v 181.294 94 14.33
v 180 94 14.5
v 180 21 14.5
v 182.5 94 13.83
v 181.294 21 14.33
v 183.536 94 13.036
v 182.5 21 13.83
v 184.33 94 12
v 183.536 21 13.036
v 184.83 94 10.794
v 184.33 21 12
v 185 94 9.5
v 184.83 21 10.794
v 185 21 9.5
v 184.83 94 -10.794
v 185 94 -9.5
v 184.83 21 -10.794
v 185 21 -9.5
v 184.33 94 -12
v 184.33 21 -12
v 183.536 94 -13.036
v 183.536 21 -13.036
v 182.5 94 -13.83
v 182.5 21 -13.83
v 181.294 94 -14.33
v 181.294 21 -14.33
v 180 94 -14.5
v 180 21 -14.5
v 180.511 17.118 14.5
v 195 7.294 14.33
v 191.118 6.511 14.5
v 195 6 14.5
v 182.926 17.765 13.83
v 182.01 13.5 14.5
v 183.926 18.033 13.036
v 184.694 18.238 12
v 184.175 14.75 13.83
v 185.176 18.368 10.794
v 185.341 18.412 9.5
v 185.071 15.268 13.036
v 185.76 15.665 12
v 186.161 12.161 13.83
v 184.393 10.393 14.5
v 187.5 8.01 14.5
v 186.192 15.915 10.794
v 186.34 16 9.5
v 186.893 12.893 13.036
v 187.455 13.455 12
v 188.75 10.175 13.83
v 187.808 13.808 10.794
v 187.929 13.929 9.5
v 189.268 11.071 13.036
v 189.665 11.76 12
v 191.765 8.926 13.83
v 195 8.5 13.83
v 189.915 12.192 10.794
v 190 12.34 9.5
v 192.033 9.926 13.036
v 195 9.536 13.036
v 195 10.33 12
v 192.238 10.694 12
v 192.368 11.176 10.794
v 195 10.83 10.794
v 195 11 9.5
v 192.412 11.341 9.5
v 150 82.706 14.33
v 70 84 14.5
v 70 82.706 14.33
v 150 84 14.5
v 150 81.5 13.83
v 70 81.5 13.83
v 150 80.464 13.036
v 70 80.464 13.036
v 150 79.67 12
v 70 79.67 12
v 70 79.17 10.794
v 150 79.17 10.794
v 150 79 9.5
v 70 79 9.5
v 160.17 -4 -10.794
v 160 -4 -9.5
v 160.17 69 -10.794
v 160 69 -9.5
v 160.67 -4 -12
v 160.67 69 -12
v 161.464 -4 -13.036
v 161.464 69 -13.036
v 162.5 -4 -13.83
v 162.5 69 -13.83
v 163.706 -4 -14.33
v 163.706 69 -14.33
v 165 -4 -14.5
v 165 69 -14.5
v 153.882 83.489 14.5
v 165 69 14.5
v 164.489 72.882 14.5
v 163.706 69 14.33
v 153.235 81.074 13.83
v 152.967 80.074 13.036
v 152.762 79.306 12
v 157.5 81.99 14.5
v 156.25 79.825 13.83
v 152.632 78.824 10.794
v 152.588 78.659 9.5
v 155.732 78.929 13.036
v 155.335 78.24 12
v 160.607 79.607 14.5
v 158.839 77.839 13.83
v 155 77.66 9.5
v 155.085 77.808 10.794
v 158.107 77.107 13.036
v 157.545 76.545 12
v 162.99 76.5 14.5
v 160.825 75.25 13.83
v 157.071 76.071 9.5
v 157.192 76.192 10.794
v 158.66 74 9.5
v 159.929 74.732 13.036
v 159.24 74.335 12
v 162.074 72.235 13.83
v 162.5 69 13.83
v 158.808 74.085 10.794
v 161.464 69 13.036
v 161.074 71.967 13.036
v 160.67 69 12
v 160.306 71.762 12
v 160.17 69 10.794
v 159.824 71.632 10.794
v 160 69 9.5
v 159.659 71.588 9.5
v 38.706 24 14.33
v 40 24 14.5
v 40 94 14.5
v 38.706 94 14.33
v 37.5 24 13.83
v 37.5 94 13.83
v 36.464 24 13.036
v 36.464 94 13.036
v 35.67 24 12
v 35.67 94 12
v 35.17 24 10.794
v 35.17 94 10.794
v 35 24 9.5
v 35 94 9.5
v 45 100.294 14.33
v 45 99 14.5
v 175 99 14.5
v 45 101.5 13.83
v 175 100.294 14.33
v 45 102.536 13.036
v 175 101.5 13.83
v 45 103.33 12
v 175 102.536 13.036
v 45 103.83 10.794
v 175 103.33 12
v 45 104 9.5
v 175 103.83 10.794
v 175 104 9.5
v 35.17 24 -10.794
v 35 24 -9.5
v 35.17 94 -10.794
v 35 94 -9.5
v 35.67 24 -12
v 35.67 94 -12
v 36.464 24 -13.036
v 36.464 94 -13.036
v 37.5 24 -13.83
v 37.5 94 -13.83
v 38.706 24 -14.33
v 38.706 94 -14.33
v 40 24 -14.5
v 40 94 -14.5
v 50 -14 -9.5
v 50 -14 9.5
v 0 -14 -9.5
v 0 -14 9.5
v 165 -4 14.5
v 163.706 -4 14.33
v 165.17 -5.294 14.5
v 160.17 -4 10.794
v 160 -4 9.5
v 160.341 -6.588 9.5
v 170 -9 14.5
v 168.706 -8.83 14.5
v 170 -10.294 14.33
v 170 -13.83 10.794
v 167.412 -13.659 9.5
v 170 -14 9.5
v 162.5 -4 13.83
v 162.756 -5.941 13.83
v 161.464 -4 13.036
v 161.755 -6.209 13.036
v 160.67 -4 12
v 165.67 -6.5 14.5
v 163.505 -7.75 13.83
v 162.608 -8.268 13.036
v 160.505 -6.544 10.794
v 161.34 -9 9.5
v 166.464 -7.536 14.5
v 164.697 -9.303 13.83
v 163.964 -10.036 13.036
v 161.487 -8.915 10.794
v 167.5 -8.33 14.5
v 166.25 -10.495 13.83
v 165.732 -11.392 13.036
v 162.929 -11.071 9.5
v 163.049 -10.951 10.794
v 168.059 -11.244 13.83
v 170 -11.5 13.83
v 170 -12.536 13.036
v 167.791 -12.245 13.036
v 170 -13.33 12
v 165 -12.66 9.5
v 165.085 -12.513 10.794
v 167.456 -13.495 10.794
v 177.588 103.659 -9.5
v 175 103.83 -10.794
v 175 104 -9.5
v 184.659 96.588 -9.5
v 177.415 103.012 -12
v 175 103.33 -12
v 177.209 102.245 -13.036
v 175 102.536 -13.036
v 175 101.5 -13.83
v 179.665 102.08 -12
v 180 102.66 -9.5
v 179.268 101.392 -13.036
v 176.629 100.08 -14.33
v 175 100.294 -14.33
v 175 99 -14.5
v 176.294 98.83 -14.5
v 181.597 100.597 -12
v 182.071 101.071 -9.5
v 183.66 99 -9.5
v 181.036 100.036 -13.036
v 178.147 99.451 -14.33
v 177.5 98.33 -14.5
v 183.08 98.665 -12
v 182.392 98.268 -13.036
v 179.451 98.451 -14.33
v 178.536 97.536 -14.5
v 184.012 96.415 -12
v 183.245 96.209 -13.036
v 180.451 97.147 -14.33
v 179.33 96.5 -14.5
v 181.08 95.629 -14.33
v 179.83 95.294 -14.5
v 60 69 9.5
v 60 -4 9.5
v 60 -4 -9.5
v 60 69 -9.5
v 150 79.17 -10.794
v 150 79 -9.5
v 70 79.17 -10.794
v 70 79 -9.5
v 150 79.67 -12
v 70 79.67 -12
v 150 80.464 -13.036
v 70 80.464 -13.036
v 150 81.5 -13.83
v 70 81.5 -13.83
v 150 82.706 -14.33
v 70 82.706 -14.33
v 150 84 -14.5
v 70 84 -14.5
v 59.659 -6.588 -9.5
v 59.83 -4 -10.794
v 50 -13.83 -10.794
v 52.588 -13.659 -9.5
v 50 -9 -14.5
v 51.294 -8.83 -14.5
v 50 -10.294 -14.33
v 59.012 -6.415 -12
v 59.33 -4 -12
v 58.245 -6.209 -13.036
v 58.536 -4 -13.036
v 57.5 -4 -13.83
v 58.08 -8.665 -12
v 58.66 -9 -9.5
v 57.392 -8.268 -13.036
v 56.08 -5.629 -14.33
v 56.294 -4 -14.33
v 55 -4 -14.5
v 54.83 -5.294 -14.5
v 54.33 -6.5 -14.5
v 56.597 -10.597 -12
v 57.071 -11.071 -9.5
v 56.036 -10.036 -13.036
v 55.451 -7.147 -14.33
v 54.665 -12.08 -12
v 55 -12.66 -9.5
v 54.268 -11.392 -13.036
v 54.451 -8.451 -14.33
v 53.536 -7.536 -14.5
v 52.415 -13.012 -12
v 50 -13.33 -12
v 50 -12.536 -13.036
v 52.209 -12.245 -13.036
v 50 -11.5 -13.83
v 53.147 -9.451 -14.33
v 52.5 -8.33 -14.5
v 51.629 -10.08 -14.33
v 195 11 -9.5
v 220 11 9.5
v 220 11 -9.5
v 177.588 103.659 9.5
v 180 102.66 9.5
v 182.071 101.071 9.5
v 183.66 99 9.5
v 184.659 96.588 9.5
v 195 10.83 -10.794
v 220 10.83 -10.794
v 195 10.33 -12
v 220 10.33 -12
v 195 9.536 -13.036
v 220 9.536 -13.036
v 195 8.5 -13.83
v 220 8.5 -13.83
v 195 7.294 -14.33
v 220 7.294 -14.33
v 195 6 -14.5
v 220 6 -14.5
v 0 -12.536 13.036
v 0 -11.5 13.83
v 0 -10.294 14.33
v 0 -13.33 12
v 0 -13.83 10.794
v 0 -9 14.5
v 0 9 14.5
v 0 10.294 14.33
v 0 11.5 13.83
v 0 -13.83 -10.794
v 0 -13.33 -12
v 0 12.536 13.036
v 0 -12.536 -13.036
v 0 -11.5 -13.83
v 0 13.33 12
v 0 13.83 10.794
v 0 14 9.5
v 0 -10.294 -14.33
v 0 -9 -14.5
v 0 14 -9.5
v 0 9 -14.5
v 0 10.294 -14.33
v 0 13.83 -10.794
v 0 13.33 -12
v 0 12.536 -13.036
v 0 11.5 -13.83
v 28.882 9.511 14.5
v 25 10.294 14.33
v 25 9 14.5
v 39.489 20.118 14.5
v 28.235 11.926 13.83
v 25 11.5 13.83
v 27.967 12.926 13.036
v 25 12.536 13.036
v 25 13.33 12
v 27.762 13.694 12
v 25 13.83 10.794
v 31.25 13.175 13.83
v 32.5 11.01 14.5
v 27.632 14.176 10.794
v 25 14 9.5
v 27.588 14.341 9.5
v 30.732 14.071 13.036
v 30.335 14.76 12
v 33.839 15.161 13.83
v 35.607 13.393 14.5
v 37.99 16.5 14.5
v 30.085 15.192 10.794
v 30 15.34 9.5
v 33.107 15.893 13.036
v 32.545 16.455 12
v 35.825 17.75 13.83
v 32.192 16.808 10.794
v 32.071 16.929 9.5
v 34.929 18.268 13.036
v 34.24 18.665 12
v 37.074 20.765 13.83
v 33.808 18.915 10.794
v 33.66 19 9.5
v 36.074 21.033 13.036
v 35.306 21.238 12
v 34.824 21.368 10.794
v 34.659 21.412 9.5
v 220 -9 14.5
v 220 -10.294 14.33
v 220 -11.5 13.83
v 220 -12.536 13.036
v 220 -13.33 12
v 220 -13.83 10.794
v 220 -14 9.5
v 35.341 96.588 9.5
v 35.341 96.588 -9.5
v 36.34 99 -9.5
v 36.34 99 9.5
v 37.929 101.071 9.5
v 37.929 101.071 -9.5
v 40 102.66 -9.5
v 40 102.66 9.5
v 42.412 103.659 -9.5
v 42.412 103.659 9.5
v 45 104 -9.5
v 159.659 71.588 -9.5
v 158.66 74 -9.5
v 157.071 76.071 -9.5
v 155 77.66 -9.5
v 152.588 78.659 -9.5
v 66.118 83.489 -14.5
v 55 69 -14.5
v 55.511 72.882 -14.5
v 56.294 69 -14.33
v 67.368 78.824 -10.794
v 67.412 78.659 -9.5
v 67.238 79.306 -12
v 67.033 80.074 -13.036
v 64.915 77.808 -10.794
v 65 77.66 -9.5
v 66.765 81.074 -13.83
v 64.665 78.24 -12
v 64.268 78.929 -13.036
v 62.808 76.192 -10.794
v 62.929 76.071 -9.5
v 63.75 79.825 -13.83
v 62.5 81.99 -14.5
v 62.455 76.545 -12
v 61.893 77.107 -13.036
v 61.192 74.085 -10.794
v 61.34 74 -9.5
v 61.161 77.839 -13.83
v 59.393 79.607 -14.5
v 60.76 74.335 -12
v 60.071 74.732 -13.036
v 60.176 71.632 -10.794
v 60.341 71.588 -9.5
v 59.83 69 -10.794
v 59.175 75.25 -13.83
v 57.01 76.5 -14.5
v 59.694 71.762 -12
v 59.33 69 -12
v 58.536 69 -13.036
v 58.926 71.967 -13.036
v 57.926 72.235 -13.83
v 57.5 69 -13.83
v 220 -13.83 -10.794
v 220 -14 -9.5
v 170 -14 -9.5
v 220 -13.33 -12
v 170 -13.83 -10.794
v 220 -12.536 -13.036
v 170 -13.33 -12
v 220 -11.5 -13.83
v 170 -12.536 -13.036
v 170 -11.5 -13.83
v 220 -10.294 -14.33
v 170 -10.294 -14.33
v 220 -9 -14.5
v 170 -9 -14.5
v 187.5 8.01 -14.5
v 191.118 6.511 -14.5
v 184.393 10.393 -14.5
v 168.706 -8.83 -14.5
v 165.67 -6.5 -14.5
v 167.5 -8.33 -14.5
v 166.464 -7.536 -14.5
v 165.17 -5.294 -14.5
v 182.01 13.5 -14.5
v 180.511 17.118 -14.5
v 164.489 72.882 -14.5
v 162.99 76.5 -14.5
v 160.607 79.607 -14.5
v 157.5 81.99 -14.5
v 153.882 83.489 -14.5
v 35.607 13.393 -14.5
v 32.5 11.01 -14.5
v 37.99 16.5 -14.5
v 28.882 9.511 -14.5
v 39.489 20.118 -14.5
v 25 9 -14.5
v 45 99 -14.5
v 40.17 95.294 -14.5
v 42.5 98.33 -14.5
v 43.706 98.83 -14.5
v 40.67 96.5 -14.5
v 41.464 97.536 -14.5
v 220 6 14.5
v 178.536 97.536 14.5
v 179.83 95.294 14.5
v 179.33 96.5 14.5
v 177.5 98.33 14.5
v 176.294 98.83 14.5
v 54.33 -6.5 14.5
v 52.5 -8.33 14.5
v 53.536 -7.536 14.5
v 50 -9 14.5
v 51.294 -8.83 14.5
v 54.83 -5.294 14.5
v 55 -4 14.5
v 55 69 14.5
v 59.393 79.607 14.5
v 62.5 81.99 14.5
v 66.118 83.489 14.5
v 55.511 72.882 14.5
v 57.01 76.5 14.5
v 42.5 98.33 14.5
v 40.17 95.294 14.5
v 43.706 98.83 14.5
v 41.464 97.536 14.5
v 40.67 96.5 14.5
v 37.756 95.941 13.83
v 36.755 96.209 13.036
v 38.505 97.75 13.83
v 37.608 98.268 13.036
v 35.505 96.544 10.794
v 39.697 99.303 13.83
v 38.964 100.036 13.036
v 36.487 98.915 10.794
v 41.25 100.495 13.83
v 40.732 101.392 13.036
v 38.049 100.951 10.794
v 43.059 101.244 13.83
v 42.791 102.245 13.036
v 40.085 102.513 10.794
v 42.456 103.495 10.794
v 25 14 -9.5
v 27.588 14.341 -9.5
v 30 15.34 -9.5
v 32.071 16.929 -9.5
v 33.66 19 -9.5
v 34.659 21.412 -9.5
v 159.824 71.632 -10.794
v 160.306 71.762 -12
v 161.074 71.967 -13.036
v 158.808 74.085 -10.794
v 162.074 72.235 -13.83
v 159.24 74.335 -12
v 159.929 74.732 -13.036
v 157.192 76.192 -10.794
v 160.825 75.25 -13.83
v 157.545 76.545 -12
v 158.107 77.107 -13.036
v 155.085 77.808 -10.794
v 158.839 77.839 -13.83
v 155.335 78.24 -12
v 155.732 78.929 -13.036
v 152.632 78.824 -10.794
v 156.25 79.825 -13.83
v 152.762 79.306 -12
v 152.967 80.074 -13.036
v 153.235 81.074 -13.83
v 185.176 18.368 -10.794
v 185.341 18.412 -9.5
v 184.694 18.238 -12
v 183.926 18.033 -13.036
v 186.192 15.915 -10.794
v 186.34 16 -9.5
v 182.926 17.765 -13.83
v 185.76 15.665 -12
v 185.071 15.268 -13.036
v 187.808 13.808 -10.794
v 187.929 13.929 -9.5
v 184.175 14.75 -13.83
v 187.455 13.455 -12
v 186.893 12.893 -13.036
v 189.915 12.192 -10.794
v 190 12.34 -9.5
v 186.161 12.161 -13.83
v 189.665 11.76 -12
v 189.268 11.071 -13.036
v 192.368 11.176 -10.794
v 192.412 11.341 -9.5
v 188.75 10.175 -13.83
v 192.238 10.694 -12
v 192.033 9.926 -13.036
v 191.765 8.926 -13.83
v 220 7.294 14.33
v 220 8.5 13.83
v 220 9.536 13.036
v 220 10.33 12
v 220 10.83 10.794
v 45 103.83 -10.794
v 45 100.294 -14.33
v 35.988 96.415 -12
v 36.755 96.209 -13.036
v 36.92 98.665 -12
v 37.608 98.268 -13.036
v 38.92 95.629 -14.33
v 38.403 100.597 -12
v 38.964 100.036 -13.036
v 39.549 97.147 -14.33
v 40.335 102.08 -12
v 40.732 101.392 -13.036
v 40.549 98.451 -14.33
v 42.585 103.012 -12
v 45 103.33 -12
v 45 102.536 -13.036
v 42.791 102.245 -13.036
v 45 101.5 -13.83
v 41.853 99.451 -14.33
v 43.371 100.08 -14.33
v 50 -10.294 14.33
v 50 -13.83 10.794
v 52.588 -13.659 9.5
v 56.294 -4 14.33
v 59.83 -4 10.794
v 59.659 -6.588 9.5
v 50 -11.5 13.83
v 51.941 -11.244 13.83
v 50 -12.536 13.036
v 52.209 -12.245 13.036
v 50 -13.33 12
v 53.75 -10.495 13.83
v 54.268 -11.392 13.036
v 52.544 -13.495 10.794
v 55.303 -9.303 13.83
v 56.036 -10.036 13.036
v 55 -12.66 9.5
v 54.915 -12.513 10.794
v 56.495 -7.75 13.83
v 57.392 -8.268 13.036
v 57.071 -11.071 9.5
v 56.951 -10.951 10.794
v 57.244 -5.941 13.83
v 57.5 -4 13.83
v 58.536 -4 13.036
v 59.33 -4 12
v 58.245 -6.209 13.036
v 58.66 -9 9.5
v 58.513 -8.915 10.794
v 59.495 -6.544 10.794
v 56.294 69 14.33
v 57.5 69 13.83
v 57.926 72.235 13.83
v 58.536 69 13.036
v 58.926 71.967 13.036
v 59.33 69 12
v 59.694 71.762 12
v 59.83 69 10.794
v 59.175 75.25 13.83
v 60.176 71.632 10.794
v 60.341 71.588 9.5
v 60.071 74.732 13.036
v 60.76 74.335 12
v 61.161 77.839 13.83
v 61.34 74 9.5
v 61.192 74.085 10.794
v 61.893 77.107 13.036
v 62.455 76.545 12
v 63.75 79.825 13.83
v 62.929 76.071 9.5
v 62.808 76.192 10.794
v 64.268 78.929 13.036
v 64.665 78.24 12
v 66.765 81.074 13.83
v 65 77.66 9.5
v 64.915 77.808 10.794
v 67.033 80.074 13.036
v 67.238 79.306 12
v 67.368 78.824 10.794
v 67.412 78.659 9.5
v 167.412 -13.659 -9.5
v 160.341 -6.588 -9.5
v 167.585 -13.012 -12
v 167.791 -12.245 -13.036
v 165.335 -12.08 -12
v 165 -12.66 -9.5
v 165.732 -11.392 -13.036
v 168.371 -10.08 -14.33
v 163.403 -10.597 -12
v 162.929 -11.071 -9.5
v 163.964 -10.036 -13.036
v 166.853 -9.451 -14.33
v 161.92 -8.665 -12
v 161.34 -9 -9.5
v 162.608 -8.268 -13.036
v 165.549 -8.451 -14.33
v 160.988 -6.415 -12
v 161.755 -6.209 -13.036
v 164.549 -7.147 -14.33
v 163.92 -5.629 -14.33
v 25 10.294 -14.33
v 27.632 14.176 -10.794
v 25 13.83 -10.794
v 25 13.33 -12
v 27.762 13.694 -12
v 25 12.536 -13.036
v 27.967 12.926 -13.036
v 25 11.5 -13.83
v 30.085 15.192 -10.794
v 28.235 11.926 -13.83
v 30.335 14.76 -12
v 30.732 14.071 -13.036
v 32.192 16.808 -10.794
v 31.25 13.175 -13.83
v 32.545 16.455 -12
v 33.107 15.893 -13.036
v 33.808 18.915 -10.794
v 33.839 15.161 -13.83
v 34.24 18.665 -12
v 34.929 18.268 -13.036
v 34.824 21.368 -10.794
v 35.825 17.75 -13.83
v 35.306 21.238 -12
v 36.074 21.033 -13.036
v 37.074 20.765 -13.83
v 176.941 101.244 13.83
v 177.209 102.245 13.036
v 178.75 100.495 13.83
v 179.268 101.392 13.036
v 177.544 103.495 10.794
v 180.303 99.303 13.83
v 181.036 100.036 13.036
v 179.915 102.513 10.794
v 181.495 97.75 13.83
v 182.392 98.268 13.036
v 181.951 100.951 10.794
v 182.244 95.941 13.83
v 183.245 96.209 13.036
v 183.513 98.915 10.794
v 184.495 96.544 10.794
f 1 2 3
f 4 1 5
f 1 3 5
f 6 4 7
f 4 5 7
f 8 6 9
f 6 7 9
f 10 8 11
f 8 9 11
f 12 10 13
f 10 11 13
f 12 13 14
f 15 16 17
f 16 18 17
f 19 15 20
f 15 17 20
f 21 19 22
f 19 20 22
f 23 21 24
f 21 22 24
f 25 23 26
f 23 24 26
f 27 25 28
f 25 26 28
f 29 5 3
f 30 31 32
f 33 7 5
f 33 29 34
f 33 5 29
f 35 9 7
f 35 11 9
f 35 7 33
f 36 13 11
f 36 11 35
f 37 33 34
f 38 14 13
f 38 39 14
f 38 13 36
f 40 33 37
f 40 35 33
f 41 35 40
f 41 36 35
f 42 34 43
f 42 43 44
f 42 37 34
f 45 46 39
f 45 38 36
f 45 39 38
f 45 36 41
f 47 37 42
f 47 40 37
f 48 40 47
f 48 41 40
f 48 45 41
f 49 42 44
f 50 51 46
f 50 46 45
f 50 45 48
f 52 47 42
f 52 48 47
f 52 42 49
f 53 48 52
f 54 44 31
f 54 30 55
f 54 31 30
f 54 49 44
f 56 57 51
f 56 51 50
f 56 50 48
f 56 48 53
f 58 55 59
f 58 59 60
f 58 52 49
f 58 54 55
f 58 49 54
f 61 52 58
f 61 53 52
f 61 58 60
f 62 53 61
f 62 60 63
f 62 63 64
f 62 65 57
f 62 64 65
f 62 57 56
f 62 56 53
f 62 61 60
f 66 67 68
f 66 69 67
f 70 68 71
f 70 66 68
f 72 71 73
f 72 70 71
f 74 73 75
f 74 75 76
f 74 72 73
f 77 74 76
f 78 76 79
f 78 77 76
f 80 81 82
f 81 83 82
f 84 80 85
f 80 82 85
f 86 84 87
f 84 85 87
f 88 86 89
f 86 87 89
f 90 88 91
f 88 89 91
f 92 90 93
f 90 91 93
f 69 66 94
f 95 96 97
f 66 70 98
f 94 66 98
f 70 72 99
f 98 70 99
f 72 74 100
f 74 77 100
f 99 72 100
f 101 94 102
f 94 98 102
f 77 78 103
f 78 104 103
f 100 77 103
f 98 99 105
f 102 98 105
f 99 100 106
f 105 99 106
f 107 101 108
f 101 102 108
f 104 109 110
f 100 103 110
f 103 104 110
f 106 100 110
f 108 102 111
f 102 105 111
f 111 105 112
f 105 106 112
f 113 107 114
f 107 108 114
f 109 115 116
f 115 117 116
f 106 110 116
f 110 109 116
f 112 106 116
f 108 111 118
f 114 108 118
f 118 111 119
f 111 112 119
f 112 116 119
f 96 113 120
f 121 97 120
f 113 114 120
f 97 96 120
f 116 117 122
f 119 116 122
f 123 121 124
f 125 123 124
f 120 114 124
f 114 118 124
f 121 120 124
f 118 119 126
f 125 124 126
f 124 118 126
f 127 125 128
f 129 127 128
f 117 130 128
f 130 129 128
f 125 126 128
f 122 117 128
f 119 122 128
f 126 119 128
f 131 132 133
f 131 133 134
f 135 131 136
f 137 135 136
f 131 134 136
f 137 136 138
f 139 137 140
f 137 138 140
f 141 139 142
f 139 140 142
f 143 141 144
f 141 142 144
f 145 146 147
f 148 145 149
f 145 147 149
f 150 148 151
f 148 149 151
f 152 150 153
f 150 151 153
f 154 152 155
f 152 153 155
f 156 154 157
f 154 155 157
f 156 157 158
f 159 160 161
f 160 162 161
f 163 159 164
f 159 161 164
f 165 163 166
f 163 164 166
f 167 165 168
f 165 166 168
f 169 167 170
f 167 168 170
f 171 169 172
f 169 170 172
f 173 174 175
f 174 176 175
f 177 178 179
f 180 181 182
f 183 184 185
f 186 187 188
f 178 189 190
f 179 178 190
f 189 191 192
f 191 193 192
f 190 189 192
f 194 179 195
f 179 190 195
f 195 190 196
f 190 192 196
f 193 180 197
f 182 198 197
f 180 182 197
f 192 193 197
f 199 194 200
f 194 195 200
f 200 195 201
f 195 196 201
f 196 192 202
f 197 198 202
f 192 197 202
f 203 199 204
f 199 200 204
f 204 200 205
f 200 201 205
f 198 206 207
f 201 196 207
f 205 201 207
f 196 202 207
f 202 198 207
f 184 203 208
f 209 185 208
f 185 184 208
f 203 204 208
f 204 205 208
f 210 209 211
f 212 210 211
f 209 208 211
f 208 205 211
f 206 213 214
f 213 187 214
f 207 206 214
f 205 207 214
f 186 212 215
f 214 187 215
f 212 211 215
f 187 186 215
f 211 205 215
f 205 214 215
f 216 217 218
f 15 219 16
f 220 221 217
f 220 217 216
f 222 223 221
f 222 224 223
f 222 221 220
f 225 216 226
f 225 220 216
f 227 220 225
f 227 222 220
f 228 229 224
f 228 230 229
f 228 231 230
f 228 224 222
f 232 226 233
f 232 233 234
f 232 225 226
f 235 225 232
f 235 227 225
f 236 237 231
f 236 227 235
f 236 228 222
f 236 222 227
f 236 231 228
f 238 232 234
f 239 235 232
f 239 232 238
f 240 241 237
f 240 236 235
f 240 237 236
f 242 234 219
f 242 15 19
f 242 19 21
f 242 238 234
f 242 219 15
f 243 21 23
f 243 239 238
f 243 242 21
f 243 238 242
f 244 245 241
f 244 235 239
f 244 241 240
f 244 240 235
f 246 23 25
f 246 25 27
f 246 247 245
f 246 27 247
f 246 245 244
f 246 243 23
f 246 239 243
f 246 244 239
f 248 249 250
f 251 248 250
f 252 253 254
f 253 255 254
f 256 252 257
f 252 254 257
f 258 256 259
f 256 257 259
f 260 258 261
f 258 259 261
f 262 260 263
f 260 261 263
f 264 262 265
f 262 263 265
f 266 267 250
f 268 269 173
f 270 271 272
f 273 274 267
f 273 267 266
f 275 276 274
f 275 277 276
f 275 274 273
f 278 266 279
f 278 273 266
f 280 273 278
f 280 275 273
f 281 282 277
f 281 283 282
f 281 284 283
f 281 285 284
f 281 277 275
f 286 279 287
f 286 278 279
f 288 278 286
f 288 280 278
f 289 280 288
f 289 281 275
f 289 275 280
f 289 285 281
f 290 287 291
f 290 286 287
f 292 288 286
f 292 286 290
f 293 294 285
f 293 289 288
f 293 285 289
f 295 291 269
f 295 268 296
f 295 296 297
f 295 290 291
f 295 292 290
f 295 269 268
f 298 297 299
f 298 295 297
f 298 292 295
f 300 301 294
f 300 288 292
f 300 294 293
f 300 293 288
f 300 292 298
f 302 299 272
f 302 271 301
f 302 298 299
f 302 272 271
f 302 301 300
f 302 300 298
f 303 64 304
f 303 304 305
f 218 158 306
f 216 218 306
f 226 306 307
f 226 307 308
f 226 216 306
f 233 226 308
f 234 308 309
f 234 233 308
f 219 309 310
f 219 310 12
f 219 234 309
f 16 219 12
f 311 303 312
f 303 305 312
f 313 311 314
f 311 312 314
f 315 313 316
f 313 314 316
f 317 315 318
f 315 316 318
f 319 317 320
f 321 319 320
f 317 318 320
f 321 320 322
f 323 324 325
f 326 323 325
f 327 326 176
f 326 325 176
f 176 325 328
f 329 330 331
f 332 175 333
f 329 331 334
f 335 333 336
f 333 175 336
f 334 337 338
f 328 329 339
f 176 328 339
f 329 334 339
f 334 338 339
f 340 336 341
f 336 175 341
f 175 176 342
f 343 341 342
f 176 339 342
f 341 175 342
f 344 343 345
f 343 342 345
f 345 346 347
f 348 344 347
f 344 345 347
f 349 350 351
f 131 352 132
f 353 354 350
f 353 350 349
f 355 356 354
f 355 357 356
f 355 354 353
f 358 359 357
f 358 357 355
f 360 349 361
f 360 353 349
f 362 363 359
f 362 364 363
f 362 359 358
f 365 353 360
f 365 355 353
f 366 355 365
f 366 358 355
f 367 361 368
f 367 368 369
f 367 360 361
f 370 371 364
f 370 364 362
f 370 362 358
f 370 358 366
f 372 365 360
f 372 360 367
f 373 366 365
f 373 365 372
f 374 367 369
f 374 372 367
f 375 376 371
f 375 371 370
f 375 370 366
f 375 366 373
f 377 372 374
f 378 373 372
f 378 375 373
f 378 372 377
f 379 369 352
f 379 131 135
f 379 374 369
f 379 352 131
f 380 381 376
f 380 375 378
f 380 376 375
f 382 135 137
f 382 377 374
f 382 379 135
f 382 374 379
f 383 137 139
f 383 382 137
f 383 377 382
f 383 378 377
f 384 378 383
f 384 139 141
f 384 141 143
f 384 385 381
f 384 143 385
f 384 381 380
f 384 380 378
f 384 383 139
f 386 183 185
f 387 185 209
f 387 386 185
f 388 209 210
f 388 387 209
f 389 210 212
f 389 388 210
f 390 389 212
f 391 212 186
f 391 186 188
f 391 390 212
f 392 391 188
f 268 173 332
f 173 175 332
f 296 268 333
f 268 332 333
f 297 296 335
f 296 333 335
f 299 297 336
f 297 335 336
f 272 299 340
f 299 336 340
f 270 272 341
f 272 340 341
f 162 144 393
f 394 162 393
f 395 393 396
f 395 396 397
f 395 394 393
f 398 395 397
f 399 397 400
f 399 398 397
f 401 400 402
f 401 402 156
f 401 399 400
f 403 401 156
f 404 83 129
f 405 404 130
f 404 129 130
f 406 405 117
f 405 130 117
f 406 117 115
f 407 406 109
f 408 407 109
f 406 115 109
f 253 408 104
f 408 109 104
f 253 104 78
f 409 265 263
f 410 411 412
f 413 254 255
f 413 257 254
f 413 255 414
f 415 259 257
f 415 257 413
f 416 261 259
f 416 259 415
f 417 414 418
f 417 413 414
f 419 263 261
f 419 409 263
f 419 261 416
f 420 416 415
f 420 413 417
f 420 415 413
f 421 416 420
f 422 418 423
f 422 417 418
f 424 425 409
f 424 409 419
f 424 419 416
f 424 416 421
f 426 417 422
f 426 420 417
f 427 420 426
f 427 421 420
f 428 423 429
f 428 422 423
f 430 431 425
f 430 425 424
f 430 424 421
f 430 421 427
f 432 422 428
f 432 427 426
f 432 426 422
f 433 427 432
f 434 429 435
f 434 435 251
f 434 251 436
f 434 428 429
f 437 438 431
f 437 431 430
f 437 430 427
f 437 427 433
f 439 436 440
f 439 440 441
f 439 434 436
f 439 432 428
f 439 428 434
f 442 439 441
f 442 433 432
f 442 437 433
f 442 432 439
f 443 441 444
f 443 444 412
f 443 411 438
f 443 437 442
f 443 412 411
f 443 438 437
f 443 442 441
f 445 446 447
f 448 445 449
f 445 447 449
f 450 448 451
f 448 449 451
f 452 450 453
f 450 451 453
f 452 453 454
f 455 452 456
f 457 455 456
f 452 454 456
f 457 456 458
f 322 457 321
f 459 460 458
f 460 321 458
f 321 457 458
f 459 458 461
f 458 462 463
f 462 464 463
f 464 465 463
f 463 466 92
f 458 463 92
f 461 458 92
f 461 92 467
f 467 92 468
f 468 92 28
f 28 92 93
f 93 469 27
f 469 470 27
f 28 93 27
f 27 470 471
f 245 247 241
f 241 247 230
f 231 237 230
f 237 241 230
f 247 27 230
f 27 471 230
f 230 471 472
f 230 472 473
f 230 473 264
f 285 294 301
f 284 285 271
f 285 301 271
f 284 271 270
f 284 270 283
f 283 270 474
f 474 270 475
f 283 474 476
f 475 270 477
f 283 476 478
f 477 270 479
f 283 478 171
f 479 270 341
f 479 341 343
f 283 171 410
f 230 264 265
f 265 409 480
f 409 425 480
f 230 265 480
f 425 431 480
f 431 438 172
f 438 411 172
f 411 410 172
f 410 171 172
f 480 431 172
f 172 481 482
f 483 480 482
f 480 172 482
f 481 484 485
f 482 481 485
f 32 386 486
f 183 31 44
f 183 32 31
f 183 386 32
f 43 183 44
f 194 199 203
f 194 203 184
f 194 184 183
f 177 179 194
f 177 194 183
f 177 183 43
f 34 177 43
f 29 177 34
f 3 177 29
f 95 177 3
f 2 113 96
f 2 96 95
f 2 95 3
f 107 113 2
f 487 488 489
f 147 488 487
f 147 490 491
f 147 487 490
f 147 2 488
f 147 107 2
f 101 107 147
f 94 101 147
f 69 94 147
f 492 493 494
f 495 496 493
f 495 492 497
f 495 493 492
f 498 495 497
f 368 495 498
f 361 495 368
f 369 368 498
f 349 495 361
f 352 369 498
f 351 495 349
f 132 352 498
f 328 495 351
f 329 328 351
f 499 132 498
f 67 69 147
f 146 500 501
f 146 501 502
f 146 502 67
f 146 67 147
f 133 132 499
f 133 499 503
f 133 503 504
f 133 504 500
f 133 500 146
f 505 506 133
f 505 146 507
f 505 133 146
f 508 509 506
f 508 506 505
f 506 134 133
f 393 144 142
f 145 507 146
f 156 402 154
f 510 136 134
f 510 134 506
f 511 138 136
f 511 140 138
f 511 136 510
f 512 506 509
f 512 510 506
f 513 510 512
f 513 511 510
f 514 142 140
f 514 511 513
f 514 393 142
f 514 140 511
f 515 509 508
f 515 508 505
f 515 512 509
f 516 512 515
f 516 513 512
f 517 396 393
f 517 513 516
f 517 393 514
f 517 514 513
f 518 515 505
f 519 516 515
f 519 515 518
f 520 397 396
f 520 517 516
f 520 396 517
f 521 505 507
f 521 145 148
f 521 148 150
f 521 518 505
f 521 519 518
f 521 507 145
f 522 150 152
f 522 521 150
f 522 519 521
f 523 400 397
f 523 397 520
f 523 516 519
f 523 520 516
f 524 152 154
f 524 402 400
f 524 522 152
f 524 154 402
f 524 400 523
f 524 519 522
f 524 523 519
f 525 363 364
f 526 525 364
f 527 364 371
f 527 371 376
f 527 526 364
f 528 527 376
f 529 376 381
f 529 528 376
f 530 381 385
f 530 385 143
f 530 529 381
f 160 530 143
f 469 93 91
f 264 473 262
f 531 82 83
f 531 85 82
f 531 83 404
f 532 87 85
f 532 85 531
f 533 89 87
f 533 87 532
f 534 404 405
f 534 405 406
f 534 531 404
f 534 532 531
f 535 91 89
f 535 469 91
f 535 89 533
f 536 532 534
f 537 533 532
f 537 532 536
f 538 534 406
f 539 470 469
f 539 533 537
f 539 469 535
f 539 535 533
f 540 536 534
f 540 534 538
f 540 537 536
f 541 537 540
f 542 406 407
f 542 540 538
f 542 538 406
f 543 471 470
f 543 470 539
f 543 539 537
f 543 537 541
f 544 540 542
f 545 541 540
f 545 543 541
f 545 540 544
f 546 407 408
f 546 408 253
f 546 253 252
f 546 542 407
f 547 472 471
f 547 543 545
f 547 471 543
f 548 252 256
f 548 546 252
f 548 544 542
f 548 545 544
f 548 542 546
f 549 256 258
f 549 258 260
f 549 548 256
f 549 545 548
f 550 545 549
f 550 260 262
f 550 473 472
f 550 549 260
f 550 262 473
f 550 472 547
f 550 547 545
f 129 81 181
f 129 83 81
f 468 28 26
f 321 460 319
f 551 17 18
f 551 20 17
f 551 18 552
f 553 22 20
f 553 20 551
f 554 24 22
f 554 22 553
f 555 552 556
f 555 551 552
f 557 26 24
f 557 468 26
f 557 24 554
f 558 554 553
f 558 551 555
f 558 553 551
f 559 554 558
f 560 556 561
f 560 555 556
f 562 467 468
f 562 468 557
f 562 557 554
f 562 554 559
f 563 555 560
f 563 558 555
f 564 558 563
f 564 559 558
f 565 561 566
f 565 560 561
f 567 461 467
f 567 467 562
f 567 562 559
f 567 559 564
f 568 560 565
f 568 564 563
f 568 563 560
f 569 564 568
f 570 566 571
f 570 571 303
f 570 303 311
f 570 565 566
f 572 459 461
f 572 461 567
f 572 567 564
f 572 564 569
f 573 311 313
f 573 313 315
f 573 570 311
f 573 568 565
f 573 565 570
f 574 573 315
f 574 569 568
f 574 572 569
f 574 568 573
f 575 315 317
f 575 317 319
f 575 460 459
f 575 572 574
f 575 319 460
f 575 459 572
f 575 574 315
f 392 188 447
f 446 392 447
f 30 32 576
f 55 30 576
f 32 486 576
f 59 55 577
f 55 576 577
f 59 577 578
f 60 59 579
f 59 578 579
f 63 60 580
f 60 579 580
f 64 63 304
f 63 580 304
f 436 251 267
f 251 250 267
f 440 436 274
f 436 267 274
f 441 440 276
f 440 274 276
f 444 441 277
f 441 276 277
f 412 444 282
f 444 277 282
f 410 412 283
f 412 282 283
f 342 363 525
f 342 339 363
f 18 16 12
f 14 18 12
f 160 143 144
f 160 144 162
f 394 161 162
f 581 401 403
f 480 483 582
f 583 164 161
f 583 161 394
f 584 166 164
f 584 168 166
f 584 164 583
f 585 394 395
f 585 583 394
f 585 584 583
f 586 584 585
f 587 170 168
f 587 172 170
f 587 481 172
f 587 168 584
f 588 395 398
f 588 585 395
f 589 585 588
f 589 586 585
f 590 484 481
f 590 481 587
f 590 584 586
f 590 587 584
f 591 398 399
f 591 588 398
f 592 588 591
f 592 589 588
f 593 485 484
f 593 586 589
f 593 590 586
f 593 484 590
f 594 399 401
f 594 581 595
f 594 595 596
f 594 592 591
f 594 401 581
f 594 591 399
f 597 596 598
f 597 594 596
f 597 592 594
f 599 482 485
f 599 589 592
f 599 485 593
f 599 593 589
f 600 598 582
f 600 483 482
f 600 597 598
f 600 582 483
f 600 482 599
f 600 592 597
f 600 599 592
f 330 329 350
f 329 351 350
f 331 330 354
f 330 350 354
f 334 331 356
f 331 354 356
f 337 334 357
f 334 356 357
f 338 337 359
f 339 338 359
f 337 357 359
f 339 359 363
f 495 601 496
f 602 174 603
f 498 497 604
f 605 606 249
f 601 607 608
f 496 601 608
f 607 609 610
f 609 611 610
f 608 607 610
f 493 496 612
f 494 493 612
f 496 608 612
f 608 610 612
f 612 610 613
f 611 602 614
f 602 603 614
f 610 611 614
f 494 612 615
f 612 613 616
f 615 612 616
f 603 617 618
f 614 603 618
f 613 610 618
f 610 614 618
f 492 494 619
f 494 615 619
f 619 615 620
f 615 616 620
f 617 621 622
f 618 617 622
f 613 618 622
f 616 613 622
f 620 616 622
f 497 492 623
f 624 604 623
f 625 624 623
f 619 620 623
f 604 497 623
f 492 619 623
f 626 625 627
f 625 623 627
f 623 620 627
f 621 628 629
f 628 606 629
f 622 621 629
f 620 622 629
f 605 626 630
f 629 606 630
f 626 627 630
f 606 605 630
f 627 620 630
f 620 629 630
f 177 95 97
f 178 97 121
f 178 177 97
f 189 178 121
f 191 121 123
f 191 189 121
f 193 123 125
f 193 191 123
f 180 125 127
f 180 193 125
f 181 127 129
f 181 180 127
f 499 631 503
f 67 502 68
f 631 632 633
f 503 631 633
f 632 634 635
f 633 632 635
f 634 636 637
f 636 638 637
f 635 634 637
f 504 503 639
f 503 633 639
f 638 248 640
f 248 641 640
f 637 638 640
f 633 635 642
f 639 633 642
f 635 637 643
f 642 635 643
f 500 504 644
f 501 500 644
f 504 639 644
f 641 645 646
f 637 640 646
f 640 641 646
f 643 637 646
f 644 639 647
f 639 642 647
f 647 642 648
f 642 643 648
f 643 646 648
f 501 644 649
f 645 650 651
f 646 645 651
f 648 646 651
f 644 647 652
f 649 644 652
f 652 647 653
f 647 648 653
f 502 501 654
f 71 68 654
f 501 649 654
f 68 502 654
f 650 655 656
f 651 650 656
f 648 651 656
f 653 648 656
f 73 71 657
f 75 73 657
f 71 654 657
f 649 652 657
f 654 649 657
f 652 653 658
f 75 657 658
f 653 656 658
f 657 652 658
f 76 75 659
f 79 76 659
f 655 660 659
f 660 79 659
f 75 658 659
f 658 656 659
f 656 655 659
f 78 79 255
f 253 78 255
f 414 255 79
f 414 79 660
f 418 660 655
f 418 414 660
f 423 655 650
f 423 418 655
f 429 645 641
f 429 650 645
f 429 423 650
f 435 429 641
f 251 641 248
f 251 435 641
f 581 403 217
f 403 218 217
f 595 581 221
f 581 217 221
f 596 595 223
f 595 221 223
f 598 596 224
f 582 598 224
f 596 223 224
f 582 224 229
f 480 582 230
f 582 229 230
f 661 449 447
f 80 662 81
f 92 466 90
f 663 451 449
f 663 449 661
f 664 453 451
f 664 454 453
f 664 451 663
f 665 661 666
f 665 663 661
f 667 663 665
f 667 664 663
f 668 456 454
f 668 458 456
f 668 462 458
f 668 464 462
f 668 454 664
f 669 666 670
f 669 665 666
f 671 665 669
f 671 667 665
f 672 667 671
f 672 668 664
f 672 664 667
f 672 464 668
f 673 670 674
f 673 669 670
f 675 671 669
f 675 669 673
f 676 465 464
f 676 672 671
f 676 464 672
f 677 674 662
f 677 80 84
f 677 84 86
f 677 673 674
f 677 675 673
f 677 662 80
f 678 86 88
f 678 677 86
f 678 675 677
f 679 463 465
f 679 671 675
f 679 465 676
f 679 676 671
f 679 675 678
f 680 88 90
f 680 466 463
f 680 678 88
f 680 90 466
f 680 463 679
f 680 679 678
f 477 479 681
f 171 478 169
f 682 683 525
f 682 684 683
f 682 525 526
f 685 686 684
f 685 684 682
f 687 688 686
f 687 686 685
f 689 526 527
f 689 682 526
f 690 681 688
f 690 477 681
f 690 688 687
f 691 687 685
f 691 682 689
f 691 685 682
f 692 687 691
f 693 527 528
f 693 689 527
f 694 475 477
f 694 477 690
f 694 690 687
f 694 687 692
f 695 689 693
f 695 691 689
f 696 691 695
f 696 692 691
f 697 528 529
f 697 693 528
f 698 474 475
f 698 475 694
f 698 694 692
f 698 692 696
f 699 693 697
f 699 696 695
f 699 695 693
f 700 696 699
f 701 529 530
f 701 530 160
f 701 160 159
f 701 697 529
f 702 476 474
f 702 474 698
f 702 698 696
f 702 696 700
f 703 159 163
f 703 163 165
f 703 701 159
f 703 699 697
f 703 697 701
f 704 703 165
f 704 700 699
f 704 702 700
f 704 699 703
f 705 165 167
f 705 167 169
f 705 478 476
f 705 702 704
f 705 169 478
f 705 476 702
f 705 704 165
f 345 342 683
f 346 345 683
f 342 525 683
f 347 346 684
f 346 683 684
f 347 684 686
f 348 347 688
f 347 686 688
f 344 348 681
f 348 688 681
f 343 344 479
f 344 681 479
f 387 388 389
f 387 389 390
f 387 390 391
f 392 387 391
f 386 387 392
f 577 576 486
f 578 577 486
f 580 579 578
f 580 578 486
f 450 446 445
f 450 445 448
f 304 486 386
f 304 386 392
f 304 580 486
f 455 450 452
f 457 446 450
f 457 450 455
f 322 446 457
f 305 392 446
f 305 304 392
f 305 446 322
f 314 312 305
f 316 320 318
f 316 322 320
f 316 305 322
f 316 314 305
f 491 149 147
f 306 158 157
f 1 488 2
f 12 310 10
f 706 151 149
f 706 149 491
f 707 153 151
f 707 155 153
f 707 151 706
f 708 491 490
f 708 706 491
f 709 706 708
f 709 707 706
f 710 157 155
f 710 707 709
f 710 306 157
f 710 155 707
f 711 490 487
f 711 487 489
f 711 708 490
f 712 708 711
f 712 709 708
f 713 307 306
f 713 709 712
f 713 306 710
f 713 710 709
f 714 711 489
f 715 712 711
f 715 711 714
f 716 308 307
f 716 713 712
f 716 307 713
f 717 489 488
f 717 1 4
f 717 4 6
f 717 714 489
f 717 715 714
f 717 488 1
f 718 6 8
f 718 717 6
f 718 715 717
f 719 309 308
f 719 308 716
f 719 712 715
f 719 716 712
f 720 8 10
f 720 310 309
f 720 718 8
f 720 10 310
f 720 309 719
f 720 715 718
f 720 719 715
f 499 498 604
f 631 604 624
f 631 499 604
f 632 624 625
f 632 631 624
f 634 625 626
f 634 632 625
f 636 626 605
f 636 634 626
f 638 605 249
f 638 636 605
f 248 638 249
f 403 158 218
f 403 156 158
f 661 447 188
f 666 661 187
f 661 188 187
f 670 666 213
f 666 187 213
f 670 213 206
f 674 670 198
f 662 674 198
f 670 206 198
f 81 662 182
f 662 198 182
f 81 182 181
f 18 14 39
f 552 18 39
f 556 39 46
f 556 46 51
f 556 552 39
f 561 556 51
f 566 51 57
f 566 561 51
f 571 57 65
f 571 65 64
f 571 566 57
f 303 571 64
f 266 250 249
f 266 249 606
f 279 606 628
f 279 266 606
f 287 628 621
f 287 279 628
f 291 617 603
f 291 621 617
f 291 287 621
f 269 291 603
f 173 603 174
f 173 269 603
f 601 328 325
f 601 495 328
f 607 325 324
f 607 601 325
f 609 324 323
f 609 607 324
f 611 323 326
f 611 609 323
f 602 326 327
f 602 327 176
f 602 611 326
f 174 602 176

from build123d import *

# Parameters (mm, degrees)
SKETCH3_W           = 29
SKETCH3_H           = 28
BOSS_EXTRUDE2_DEPTH = 60
SKETCH4_W           = 25
SKETCH4_H           = 29
BOSS_EXTRUDE3_DEPTH = 90
SKETCH5_W           = 29
SKETCH5_H           = 25
BOSS_EXTRUDE4_DEPTH = 125
SKETCH7_W           = 25
SKETCH7_H           = 29
BOSS_EXTRUDE5_DEPTH = 93
SKETCH8_W           = 29
SKETCH8_H           = 25
BOSS_EXTRUDE6_DEPTH = 35
FILLET1_R           = 10
FILLET2_R           = 10
FILLET3_R           = 5


with BuildPart() as part:
    # Sketch3 → Boss-Extrude2 (new body)
    with BuildSketch(Plane(origin=(0, 0, 0), x_dir=(0, 0, -1), z_dir=(1, 0, 0))):
        Rectangle(SKETCH3_W, SKETCH3_H)
    extrude(amount=BOSS_EXTRUDE2_DEPTH)

    # Sketch4 → Boss-Extrude3 (add)
    with BuildSketch(Plane(origin=(0, 14, 0), x_dir=(1, 0, 0), z_dir=(0, 1, 0))):
        with Locations((47.5, 0)):
            Rectangle(SKETCH4_W, SKETCH4_H)
    extrude(amount=BOSS_EXTRUDE3_DEPTH)

    # Sketch5 → Boss-Extrude4 (add)
    with BuildSketch(Plane(origin=(60, 0, 0), x_dir=(0, 0, -1), z_dir=(1, 0, 0))):
        with Locations((0, 91.5)):
            Rectangle(SKETCH5_W, SKETCH5_H)
    extrude(amount=BOSS_EXTRUDE4_DEPTH)

    # Sketch7 → Boss-Extrude5 (add)
    with BuildSketch(Plane.XZ.offset(-79)):
        with Locations((172.5, 0)):
            Rectangle(SKETCH7_W, SKETCH7_H)
    extrude(amount=BOSS_EXTRUDE5_DEPTH)

    # Sketch8 → Boss-Extrude6 (add)
    with BuildSketch(Plane(origin=(185, 0, 0), x_dir=(0, 0, -1), z_dir=(1, 0, 0))):
        with Locations((0, -1.5)):
            Rectangle(SKETCH8_W, SKETCH8_H)
    extrude(amount=BOSS_EXTRUDE6_DEPTH)

    # Fillet1
    fillet1_edges = [part.edges().sort_by_distance(p)[0] for p in [
        (35, 14, 0),
        (35, 104, 0),
        (185, 104, 0),
        (160, 79, 0),
        (185, 11, 0),
    ]]
    fillet(fillet1_edges, radius=FILLET1_R)

    # Fillet2
    fillet2_edges = [part.edges().sort_by_distance(p)[0] for p in [
        (60, 79, 0),
        (160, -14, 0),
        (60, -14, 0),
    ]]
    fillet(fillet2_edges, radius=FILLET2_R)

    # Fillet3
    fillet3_edges = [part.edges().sort_by_distance(p)[0] for p in [
        (60, 32.5, 14.5),
        (60, 32.5, -14.5),
        (195, -14, -14.5),
        (160, 32.5, -14.5),
        (25, -14, -14.5),
        (162.928932188, -11.071067812, -14.5),
        (57.071067812, -11.071067812, -14.5),
        (25, -14, 14.5),
        (160, 32.5, 14.5),
        (162.928932188, -11.071067812, 14.5),
        (57.071067812, -11.071067812, 14.5),
        (62.928932188, 76.071067812, -14.5),
        (62.928932188, 76.071067812, 14.5),
        (195, -14, 14.5),
        (207.5, 11, -14.5),
        (207.5, 11, 14.5),
        (110, 79, 14.5),
        (110, 79, -14.5),
        (35, 59, 14.5),
        (35, 59, -14.5),
        (12.5, 14, -14.5),
        (12.5, 14, 14.5),
        (110, 104, 14.5),
        (110, 104, -14.5),
        (185, 57.5, 14.5),
        (182.071067812, 101.071067812, 14.5),
        (37.928932188, 101.071067812, 14.5),
        (185, 57.5, -14.5),
        (182.071067812, 101.071067812, -14.5),
        (37.928932188, 101.071067812, -14.5),
        (157.071067812, 76.071067812, -14.5),
        (157.071067812, 76.071067812, 14.5),
        (32.071067812, 16.928932188, 14.5),
        (32.071067812, 16.928932188, -14.5),
        (187.928932188, 13.928932188, 14.5),
        (187.928932188, 13.928932188, -14.5),
    ]]
    fillet(fillet3_edges, radius=FILLET3_R)


solid = part.part
